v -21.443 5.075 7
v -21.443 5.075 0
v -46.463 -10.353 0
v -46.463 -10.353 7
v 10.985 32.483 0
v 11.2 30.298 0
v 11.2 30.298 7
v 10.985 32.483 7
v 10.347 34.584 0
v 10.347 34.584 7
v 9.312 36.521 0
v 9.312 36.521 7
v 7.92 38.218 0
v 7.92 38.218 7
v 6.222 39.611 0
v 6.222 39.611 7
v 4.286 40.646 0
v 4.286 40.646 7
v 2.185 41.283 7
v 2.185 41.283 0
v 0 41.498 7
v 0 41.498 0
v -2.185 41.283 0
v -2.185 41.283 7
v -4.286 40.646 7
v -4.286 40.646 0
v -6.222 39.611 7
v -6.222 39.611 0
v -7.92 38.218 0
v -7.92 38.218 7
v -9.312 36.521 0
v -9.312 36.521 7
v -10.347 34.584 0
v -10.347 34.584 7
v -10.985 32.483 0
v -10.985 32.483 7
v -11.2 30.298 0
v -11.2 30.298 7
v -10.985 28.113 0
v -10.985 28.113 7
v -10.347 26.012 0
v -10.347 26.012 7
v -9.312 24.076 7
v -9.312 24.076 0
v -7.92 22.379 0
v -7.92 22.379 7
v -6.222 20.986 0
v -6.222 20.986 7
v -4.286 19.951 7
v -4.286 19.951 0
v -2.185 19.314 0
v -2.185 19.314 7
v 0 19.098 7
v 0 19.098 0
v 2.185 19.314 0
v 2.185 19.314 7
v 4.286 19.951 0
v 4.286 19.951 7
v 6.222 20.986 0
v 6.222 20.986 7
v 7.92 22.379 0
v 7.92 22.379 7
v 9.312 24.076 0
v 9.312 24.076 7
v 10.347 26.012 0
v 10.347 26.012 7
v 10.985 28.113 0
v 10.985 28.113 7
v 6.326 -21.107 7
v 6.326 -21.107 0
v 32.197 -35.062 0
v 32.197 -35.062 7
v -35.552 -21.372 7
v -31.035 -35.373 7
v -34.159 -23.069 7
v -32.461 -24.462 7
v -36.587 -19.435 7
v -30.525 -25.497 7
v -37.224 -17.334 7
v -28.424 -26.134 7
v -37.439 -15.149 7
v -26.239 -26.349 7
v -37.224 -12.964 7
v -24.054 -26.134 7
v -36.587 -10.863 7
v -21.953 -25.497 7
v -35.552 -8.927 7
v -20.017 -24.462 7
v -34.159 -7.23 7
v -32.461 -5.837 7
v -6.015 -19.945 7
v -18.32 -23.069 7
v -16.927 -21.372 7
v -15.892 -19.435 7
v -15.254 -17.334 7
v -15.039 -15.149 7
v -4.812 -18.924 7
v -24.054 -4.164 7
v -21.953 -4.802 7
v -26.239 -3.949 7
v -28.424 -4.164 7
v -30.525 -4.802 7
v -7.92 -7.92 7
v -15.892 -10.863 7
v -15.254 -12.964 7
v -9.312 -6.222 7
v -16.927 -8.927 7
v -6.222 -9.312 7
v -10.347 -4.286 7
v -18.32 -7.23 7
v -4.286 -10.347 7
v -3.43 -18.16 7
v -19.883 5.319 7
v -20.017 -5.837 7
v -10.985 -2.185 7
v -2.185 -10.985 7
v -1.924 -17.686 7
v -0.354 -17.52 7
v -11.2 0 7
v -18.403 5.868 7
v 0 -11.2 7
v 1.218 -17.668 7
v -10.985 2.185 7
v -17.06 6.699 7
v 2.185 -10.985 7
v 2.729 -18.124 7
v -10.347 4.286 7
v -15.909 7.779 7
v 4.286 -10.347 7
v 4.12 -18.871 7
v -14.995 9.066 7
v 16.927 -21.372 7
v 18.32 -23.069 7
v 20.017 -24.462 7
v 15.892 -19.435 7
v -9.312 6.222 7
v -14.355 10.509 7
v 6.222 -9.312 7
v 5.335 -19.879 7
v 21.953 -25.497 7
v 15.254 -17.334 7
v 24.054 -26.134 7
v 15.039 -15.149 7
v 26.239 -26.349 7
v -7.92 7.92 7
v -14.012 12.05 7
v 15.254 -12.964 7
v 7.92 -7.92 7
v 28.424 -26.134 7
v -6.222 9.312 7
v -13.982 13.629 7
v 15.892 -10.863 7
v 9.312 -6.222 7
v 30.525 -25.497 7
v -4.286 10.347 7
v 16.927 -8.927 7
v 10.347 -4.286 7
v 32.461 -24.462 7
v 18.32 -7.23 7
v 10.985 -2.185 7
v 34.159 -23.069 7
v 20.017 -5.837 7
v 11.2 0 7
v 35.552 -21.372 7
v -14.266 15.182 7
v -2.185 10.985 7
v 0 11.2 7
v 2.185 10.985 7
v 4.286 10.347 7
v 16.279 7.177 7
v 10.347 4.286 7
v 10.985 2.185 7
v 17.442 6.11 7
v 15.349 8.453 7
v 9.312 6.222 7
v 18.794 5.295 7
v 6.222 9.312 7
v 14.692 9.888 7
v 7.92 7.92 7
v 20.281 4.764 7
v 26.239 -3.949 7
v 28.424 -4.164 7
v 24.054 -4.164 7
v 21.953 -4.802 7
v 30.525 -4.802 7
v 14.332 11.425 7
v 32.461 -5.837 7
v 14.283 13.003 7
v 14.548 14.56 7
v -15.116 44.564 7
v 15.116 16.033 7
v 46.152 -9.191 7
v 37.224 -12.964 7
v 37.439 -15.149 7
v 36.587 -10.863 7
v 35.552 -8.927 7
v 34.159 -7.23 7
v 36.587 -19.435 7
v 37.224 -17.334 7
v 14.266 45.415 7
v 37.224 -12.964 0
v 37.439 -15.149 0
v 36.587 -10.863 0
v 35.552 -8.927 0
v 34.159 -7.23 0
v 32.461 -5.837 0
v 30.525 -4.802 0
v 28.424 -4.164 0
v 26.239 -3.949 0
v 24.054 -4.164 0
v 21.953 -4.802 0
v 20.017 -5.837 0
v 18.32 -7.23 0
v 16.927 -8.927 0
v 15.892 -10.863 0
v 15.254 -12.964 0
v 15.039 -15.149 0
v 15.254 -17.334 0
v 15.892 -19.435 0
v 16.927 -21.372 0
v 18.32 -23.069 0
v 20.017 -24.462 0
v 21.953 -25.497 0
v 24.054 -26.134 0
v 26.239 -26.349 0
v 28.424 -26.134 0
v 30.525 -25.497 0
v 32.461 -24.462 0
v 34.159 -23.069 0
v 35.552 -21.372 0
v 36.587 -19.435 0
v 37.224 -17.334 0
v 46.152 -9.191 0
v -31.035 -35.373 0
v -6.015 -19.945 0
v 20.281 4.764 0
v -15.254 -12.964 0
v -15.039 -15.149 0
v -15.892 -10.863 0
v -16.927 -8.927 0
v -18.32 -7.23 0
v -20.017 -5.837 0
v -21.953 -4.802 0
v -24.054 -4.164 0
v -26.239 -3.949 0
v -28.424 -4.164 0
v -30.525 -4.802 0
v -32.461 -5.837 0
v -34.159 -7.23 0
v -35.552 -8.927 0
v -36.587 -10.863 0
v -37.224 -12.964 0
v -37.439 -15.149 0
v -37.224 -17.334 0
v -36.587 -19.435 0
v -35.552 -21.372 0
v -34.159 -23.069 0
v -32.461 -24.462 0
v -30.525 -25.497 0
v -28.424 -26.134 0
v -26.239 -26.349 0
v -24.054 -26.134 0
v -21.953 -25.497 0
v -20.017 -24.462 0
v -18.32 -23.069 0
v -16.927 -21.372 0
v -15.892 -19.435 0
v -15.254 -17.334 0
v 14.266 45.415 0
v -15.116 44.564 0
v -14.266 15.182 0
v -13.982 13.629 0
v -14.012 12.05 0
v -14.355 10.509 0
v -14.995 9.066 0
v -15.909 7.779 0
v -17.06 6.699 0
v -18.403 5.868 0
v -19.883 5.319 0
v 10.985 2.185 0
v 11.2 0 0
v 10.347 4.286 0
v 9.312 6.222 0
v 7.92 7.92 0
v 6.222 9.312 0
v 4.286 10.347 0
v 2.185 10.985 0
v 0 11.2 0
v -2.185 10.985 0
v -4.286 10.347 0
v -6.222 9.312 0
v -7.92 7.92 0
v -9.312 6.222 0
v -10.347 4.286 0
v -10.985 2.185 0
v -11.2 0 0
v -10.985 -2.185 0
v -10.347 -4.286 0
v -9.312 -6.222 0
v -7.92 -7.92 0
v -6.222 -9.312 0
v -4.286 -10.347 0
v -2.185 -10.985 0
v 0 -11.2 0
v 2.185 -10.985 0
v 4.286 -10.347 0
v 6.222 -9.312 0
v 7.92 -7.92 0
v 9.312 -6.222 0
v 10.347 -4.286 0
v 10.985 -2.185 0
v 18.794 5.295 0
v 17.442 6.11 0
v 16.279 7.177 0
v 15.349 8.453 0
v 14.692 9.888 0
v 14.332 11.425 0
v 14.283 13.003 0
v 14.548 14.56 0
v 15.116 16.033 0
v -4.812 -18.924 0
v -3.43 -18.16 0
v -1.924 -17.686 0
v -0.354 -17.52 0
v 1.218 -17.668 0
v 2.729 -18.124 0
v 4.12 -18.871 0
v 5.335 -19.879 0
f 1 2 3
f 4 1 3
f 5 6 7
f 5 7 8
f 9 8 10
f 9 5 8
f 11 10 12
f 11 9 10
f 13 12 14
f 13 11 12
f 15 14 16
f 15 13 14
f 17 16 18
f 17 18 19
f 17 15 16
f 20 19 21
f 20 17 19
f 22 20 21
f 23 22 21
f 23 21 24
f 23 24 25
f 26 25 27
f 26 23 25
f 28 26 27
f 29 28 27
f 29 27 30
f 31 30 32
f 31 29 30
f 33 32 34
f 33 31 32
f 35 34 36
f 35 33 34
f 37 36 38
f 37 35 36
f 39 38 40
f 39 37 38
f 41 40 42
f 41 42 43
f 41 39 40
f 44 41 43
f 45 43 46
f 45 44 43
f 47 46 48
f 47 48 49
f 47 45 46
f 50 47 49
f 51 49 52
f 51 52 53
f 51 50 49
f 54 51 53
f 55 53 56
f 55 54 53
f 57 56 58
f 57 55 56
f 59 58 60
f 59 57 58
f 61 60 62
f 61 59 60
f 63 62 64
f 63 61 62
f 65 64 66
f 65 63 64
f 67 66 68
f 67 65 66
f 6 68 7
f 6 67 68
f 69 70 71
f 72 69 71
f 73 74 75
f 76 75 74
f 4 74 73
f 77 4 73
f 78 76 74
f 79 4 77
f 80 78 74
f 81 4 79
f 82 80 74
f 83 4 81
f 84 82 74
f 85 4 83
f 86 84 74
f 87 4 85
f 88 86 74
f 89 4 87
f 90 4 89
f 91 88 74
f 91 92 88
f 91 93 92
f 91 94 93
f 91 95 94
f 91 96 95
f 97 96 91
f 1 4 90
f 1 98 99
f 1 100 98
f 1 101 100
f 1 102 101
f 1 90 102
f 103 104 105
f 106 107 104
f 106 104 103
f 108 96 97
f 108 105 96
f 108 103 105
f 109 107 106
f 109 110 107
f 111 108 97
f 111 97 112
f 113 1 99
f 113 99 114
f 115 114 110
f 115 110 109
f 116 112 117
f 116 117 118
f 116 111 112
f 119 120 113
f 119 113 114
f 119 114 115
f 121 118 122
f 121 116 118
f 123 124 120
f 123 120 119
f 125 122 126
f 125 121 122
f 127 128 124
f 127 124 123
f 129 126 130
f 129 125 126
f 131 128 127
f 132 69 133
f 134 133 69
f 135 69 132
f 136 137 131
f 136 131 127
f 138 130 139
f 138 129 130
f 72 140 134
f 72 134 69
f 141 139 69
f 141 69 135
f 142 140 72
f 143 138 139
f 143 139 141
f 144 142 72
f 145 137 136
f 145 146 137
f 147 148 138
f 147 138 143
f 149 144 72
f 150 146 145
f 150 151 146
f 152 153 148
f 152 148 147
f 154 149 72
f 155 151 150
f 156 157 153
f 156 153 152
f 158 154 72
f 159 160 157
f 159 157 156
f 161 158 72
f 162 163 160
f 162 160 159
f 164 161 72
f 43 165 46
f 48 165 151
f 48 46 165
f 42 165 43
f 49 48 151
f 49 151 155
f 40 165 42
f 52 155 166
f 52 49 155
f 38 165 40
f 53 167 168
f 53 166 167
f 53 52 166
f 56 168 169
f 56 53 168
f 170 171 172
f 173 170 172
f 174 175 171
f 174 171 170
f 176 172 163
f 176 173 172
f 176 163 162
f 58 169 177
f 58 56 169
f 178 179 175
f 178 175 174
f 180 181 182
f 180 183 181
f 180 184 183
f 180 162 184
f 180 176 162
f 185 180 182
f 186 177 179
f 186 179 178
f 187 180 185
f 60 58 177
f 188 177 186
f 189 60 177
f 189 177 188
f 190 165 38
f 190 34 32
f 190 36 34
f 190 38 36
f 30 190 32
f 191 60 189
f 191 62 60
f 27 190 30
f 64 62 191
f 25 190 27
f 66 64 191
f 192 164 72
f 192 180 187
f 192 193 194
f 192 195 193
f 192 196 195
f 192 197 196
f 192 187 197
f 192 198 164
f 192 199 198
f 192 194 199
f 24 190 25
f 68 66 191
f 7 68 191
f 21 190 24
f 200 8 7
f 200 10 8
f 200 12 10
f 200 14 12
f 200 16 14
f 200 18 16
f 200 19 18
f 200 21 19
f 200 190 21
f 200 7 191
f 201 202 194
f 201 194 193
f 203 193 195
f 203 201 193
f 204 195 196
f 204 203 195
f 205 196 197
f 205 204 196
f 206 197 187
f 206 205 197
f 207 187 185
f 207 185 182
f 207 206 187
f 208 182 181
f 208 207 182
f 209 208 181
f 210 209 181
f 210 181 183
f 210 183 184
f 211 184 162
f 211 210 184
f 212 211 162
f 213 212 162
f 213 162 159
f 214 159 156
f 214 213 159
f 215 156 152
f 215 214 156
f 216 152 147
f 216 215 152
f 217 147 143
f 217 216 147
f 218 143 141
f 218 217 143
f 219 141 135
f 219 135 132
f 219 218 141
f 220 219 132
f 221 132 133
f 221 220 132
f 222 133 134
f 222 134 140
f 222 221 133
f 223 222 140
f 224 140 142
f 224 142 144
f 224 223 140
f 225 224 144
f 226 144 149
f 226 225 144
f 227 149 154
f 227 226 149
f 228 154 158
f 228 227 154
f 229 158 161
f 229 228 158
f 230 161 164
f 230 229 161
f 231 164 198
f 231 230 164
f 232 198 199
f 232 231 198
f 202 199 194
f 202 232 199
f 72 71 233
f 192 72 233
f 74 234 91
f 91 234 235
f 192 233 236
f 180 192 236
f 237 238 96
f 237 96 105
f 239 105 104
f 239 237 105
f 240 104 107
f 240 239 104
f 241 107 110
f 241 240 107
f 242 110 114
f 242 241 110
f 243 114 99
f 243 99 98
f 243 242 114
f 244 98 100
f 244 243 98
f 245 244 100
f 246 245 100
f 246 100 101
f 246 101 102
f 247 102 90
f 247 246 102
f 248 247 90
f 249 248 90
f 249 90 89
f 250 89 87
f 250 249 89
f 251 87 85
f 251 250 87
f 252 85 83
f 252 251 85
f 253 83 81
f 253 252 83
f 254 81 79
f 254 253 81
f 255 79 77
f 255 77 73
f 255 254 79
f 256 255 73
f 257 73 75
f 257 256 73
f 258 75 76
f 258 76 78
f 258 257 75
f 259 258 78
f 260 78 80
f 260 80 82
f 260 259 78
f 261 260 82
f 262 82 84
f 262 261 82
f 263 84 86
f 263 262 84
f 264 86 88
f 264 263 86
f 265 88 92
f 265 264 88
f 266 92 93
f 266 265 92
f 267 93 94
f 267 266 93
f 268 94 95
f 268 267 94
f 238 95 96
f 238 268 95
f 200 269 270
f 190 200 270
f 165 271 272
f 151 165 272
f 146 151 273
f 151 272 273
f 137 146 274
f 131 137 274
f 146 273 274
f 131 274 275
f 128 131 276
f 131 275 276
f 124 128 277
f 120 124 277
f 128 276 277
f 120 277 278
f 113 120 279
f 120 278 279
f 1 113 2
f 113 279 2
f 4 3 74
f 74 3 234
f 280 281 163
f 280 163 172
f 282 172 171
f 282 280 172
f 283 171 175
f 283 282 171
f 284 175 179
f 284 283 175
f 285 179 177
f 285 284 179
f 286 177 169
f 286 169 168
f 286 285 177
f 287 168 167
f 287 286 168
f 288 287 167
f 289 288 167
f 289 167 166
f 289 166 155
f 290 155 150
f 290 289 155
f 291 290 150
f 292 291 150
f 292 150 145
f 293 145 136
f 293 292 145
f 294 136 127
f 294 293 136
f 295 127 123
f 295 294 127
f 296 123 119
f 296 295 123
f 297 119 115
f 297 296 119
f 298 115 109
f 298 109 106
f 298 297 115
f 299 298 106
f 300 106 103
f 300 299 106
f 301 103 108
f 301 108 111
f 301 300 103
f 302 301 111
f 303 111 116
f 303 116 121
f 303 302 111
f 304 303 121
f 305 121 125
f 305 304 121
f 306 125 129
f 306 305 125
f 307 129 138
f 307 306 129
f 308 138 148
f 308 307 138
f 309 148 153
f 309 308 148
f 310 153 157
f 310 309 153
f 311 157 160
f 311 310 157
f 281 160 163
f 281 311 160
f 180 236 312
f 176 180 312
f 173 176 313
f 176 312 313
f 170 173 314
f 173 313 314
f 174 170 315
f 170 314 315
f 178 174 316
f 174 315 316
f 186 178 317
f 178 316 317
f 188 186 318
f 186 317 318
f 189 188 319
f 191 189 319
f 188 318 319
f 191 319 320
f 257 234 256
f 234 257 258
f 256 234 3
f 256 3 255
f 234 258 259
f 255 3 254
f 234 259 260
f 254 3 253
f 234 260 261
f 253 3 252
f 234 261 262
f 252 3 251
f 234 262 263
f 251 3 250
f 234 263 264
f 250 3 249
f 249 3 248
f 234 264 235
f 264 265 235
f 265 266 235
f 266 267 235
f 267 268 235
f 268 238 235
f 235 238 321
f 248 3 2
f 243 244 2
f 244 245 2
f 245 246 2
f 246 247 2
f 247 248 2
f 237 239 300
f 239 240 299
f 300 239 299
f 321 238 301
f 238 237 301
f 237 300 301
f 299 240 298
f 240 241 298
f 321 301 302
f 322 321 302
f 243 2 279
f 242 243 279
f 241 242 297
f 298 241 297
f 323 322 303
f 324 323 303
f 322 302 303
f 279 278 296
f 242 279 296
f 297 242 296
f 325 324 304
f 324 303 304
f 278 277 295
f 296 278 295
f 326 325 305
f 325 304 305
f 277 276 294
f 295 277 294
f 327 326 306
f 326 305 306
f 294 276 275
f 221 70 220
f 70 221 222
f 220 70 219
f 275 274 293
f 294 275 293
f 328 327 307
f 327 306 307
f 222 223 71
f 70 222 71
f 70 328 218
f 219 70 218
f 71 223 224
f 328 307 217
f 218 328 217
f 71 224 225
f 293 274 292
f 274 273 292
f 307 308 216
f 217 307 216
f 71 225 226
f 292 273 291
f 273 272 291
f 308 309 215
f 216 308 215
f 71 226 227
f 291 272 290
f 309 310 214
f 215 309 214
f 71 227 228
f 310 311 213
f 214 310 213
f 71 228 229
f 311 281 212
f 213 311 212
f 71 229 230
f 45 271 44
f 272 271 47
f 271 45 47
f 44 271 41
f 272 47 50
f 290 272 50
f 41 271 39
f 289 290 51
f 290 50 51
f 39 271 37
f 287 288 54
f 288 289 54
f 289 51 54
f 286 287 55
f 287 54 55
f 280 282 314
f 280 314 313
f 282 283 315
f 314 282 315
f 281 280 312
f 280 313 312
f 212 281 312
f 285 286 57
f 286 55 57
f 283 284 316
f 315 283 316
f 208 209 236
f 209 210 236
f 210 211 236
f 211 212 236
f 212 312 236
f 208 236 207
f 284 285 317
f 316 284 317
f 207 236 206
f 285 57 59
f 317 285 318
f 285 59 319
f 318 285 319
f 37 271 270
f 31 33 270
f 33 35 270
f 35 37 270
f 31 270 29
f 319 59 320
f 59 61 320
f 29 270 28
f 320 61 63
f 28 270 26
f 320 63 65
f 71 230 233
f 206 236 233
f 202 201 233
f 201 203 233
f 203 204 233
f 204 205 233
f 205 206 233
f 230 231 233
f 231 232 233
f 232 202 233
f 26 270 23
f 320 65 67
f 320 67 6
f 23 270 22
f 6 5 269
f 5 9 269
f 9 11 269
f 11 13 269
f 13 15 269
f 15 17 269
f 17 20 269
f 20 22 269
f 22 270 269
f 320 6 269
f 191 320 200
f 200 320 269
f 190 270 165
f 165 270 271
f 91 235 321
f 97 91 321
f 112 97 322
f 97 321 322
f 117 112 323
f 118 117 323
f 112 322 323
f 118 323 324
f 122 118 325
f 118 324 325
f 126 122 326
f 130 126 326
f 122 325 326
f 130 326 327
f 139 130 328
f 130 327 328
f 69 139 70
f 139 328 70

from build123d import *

# Parameters (mm, degrees)
F0_R     = 11.2
F1_DEPTH = 7


with BuildPart() as f1:
    # F0 (on Top) → F1 (new body)
    with BuildSketch(Plane.XY):
        with BuildLine():
            Line((14.265774, 45.414708), (-15.116394, 44.564087))
            Line((-15.116394, 44.564087), (-14.265774, 15.181919))
            ThreePointArc((-14.265774, 15.181919), (-15.420315, 8.400052), (-21.442784, 5.074912))
            Line((-21.442784, 5.074912), (-46.463177, -10.352831))
            Line((-46.463177, -10.352831), (-31.035434, -35.373225))
            Line((-31.035434, -35.373225), (-6.01504, -19.945482))
            ThreePointArc((-6.01504, -19.945482), (0.435499, -17.554411), (6.326389, -21.107451))
            Line((6.326389, -21.107451), (32.197404, -35.061876))
            Line((32.197404, -35.061876), (46.151829, -9.190862))
            Line((46.151829, -9.190862), (20.280814, 4.763563))
            ThreePointArc((20.280814, 4.763563), (14.984816, 9.154359), (15.116394, 16.032539))
            Line((15.116394, 16.032539), (14.265774, 45.414708))
        make_face()
        with Locations((-26.239109, -15.149157)):
            Circle(F0_R, mode=Mode.SUBTRACT)
        Circle(F0_R, mode=Mode.SUBTRACT)
        with Locations((26.239109, -15.149157)):
            Circle(F0_R, mode=Mode.SUBTRACT)
        with Locations((0, 30.298313)):
            Circle(F0_R, mode=Mode.SUBTRACT)
    extrude(amount=F1_DEPTH)


solid = f1.part
